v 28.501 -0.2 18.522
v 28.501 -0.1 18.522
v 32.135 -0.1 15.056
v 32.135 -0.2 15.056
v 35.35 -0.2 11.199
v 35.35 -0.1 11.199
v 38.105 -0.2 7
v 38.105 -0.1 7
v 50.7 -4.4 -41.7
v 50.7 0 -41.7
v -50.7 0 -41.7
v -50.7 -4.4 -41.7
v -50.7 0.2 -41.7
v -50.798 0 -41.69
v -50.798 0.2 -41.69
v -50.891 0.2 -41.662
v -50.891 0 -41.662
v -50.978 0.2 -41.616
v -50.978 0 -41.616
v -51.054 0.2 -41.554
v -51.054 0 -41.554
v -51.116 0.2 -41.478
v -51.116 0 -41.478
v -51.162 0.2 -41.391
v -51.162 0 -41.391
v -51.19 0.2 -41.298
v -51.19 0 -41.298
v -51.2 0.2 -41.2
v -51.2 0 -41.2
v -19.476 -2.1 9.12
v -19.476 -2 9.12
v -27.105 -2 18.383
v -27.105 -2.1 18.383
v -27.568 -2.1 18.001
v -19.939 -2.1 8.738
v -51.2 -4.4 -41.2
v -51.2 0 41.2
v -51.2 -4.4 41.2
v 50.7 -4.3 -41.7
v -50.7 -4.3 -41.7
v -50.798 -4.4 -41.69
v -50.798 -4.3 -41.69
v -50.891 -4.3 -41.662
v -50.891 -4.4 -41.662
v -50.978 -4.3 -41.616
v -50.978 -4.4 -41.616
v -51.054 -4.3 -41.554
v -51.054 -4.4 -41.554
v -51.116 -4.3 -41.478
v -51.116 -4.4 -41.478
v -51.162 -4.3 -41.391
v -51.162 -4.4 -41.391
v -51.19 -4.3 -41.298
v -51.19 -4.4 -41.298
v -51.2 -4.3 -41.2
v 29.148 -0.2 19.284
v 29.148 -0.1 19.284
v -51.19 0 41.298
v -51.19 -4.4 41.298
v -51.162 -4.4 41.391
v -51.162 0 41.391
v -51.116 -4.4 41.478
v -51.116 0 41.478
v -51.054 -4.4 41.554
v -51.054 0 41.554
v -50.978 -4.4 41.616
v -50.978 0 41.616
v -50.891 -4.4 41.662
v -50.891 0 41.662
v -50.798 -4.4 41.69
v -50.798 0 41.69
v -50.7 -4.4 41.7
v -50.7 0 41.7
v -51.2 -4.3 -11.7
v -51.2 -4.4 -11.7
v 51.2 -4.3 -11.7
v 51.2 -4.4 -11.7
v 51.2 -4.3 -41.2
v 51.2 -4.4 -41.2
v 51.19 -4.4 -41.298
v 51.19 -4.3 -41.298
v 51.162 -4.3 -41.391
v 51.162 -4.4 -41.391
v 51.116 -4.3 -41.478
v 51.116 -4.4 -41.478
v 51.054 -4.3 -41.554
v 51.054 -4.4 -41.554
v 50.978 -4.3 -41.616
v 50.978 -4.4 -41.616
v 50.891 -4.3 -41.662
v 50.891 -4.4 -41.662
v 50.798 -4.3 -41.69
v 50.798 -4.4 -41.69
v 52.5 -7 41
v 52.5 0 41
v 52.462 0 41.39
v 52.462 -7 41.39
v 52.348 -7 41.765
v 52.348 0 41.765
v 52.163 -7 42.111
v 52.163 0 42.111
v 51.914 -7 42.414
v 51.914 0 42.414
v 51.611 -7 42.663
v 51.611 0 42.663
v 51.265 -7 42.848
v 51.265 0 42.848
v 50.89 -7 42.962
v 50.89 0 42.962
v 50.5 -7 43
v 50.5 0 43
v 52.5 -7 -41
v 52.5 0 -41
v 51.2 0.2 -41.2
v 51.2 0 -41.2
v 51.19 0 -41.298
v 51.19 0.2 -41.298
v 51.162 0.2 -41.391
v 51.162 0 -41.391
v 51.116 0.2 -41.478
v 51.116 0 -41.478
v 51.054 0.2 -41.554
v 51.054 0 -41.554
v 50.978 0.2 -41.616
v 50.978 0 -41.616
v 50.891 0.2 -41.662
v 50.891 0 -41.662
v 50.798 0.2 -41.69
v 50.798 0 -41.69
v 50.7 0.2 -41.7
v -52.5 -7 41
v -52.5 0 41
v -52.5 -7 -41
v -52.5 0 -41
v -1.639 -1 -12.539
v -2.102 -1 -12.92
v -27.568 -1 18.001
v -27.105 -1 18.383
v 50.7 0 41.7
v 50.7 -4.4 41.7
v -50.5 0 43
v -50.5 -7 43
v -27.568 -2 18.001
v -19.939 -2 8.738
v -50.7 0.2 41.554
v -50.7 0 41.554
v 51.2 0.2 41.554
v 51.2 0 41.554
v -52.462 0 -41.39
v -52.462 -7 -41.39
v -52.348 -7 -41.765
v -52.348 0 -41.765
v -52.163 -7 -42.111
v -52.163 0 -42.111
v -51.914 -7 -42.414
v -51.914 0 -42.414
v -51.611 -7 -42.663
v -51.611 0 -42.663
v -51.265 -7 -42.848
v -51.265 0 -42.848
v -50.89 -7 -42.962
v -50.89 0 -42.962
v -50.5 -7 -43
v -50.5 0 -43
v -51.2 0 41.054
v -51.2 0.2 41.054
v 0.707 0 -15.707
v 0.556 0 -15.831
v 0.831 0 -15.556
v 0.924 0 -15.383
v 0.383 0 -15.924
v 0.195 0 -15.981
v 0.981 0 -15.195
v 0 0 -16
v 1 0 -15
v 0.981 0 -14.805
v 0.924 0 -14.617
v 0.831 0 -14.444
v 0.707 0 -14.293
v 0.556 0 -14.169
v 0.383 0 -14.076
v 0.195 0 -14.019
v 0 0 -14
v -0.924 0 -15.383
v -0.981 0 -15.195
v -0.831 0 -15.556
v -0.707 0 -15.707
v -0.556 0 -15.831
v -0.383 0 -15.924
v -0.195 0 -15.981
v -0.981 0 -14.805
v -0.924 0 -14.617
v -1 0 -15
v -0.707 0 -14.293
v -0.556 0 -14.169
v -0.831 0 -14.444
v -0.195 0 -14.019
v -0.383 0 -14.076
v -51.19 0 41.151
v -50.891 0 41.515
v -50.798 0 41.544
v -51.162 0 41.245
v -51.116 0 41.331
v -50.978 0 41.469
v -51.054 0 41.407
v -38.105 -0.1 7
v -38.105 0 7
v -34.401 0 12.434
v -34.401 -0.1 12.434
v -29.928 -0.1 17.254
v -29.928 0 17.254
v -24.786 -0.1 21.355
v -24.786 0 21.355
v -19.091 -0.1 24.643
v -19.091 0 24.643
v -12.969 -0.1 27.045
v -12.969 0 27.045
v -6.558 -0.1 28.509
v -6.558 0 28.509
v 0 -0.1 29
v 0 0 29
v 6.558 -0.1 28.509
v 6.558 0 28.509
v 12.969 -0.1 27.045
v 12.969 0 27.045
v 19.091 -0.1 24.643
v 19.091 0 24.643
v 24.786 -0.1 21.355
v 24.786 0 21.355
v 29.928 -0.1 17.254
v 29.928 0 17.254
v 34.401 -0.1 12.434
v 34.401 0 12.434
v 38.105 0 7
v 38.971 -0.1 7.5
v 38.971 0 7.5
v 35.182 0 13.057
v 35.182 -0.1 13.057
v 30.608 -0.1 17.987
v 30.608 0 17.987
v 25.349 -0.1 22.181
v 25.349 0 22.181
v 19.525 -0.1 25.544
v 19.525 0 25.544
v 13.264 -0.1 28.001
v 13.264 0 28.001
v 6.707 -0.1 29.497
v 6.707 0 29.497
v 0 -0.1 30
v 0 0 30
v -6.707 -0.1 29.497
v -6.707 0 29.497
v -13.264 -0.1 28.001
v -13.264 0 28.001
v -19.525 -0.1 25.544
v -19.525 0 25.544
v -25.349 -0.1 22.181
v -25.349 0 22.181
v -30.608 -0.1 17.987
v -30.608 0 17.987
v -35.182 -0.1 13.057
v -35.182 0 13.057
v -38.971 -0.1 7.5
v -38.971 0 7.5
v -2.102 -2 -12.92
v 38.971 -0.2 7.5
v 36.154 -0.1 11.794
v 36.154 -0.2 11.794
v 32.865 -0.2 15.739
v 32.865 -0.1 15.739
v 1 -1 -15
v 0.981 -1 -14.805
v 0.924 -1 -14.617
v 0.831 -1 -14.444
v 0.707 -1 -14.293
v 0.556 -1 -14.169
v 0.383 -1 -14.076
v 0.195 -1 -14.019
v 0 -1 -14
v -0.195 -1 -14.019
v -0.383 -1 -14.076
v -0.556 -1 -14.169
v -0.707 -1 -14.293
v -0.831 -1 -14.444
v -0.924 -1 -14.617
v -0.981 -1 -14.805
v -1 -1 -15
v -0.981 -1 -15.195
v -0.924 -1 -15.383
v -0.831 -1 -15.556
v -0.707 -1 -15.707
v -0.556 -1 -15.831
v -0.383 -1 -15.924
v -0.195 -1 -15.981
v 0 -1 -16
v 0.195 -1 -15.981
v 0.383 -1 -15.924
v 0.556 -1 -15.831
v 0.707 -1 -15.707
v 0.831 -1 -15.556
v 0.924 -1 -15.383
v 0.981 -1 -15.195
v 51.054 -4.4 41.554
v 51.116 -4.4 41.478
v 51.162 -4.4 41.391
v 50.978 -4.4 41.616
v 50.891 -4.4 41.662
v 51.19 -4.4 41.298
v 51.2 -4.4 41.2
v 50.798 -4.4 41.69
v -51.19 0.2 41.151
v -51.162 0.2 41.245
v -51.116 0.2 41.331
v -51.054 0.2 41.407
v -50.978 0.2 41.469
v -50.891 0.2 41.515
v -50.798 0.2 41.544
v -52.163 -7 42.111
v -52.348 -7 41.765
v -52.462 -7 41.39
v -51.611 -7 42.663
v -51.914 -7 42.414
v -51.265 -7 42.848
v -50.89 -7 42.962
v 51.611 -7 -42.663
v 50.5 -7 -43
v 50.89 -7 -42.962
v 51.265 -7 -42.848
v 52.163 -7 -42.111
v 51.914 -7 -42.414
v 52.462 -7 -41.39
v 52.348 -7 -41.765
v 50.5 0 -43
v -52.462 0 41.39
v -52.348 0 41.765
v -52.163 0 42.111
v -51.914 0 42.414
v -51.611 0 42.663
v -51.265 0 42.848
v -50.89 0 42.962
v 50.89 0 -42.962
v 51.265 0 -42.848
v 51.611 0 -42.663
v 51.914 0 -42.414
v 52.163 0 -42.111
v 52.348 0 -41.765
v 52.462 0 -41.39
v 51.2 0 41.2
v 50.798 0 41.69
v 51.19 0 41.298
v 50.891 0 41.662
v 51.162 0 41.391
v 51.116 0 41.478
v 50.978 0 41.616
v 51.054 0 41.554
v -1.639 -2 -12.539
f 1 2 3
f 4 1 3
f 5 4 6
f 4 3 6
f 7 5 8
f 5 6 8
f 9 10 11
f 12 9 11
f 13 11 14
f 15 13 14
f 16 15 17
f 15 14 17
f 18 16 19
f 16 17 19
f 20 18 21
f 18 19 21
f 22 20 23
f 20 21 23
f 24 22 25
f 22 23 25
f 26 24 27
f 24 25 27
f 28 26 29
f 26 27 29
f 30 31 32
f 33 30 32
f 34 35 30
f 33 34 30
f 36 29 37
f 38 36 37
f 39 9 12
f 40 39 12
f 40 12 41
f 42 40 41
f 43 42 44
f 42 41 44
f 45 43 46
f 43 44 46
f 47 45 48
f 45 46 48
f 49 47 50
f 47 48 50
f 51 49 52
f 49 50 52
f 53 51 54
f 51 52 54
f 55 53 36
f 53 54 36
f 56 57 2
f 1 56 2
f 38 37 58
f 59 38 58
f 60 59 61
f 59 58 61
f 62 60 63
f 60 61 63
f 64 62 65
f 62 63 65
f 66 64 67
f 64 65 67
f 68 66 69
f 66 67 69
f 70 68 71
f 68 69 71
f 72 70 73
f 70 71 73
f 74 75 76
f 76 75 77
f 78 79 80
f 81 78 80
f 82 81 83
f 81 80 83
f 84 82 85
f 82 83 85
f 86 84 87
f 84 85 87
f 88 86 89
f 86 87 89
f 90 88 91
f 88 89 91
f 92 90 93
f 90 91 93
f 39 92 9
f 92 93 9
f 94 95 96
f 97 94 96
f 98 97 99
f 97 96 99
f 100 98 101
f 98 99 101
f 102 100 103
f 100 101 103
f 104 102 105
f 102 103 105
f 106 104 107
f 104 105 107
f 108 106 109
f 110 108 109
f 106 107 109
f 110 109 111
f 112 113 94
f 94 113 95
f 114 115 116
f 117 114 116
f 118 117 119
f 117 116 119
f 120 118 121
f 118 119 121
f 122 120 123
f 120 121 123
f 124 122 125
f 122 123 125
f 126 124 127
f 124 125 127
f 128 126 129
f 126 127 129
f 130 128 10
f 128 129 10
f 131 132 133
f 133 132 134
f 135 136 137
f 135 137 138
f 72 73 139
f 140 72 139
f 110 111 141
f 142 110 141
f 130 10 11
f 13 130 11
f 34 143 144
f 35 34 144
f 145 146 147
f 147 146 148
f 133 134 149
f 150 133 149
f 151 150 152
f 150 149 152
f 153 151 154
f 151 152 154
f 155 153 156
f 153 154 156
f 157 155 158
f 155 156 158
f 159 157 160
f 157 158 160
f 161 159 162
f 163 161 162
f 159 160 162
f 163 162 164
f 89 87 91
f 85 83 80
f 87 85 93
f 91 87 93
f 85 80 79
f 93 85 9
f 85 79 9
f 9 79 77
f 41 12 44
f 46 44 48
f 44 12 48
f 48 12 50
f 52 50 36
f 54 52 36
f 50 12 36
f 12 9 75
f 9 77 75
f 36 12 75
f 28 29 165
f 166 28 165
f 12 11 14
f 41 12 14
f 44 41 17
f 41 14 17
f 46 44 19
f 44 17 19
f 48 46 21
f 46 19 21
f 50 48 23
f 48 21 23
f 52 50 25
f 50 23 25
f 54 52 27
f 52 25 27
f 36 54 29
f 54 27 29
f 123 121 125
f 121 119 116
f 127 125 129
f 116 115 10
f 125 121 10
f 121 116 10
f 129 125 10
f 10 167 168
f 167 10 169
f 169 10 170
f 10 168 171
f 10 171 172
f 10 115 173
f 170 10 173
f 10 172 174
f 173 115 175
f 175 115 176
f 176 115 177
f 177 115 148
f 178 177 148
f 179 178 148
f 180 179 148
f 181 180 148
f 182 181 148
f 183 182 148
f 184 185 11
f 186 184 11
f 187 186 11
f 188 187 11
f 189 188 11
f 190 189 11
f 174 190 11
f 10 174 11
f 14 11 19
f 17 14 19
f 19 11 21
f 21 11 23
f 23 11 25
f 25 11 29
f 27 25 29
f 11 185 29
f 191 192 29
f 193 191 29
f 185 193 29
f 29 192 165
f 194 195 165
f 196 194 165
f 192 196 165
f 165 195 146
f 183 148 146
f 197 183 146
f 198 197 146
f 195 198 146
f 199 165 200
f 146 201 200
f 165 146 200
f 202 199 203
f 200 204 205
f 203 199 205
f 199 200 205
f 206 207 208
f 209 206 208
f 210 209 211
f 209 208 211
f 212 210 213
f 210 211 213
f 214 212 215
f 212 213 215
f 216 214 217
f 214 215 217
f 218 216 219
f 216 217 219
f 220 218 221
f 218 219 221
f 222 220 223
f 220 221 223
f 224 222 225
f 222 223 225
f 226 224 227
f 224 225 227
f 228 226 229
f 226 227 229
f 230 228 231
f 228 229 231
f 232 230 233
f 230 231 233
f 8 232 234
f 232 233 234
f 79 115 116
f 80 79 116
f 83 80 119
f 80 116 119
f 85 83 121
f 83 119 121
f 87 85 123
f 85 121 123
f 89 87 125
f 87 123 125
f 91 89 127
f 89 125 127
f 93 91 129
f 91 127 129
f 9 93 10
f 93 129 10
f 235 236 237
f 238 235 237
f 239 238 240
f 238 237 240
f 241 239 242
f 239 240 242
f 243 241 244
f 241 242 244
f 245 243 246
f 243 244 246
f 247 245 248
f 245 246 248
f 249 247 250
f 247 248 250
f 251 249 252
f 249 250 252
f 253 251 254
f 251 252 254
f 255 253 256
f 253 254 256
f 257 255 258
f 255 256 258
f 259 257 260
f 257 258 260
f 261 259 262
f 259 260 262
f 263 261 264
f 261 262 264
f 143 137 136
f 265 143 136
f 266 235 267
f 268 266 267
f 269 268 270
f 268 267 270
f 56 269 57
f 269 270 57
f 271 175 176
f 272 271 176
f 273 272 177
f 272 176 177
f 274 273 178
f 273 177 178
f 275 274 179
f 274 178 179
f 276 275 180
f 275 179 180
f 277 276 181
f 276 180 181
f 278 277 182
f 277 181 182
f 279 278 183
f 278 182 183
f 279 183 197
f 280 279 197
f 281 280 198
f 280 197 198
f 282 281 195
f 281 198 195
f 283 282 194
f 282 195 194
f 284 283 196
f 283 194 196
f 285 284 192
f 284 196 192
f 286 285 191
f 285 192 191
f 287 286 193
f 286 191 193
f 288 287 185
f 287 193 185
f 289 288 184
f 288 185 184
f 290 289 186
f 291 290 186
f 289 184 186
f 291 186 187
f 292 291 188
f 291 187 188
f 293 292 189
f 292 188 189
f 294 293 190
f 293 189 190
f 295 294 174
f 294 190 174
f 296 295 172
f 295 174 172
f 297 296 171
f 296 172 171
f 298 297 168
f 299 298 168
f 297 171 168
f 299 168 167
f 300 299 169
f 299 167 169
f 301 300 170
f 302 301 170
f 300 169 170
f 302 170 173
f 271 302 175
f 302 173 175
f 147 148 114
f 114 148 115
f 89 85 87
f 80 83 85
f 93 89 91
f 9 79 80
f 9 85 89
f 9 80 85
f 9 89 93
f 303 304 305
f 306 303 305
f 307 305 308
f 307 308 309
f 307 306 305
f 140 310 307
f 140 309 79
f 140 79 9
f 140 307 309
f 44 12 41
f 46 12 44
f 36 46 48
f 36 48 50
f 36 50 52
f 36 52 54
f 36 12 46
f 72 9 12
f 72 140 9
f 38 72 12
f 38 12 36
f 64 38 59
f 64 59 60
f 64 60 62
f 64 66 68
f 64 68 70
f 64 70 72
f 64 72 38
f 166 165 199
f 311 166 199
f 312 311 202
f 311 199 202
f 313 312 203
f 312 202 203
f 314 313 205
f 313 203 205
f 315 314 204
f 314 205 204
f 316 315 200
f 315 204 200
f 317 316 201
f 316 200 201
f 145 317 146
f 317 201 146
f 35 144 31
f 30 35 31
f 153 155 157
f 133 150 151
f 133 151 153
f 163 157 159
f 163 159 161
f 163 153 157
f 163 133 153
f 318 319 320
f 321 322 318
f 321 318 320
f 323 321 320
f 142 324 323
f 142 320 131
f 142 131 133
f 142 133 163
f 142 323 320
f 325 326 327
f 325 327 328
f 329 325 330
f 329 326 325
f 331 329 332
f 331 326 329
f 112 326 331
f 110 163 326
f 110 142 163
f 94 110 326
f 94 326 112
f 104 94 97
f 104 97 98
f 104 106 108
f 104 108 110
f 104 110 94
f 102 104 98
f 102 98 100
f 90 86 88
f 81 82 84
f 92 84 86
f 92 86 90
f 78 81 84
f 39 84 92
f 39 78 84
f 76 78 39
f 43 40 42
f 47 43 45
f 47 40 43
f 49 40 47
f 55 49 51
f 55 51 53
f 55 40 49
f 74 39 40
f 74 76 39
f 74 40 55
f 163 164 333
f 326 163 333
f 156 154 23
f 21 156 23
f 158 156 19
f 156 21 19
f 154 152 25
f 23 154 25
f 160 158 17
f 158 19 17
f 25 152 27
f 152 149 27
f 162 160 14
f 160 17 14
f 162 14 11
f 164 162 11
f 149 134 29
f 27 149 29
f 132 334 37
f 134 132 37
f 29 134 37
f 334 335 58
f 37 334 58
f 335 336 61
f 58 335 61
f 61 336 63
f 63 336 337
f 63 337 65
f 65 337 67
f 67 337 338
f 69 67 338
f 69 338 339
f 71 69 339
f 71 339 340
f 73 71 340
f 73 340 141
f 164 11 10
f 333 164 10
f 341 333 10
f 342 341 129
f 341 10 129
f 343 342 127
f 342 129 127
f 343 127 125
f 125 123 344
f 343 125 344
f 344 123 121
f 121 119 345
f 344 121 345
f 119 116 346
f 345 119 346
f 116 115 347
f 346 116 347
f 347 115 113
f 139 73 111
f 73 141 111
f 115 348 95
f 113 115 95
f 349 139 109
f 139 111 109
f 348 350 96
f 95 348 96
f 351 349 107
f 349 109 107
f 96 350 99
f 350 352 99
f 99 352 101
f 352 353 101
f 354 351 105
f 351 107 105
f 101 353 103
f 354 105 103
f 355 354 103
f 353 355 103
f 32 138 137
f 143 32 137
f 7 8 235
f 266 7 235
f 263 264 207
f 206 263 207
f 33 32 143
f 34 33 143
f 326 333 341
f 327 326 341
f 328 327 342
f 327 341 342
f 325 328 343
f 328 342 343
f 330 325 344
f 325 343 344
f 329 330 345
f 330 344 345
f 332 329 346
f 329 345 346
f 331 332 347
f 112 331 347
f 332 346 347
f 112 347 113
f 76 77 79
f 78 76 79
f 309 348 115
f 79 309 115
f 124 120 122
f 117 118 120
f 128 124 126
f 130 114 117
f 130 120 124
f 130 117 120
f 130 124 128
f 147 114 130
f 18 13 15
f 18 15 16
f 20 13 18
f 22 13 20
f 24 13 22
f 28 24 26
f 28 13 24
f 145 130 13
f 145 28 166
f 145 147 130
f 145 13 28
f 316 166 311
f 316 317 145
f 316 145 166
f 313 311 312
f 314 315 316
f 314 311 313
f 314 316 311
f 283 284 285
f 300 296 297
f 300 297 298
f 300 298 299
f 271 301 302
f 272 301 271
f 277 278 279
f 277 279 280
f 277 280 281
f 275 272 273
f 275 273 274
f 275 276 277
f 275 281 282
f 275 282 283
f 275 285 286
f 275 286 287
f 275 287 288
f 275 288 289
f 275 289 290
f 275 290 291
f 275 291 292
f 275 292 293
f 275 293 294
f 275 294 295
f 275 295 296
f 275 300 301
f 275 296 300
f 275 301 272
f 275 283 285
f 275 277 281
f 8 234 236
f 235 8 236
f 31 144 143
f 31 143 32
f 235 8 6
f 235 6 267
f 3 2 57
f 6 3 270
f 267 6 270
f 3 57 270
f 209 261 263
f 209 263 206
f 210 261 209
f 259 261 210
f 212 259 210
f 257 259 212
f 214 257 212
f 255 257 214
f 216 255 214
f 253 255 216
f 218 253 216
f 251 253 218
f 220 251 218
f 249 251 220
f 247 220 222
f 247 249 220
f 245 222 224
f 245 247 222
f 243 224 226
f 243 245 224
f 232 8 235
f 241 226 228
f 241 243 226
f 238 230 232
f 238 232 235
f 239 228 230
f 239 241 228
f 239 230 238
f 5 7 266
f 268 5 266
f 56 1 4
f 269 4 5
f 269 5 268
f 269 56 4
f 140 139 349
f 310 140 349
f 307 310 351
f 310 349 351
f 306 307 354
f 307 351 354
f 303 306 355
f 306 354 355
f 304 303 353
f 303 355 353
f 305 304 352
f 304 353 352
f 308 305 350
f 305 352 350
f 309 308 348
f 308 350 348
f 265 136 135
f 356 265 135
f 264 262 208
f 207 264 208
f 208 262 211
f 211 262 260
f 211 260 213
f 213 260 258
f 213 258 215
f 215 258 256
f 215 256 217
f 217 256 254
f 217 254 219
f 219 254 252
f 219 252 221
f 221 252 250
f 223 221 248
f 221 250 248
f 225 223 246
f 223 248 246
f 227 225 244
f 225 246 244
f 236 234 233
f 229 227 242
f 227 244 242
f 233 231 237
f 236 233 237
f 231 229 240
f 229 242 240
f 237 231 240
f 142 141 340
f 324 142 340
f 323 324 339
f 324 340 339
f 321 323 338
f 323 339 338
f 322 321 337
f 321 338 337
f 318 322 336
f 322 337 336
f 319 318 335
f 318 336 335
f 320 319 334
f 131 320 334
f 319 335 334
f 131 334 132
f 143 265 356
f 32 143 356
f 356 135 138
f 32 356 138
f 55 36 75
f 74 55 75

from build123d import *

# Parameters (mm, degrees)
F1_DEPTH  = 7
F3_DEPTH  = 4.4
F5_DEPTH  = 0.2
F7_DEPTH  = 0.1
F8_R      = 1
F9_DEPTH  = 1
F11_DEPTH = 1
F13_DEPTH = 0.1
F15_DEPTH = 0.1
F17_DEPTH = 0.1


with BuildPart() as f1:
    # F0 (on Front) → F1 (new body)
    with BuildSketch(Plane.XZ):
        with BuildLine():
            Line((50.5, 43), (-50.5, 43))
            ThreePointArc((-50.5, 43), (-51.914214, 42.414214), (-52.5, 41))
            Line((-52.5, 41), (-52.5, -41))
            ThreePointArc((-52.5, -41), (-51.914214, -42.414214), (-50.5, -43))
            Line((-50.5, -43), (50.5, -43))
            ThreePointArc((50.5, -43), (51.914214, -42.414214), (52.5, -41))
            Line((52.5, -41), (52.5, 41))
            ThreePointArc((52.5, 41), (51.914214, 42.414214), (50.5, 43))
        make_face()
    extrude(amount=F1_DEPTH)

    # F2 (on face) → F3 (cut)
    with BuildSketch(Plane(origin=(0, 0, 0), x_dir=(-1, 0, 0), z_dir=(0, 1, 0))):
        with BuildLine():
            Line((-50.7, -41.7), (50.7, -41.7))
            ThreePointArc((50.7, -41.7), (51.053553, -41.553553), (51.2, -41.2))
            Line((51.2, -41.2), (51.2, 41.2))
            ThreePointArc((51.2, 41.2), (51.053553, 41.553553), (50.7, 41.7))
            Line((50.7, 41.7), (-50.7, 41.7))
            ThreePointArc((-50.7, 41.7), (-51.053553, 41.553553), (-51.2, 41.2))
            Line((-51.2, 41.2), (-51.2, -41.2))
            ThreePointArc((-51.2, -41.2), (-51.053553, -41.553553), (-50.7, -41.7))
        make_face()
    extrude(amount=-F3_DEPTH, mode=Mode.SUBTRACT)


with BuildPart() as f5:
    # F4 (on face) → F5 (new body)
    with BuildSketch(Plane(origin=(0, 0, 0), x_dir=(-1, 0, 0), z_dir=(0, 1, 0))):
        with BuildLine():
            Line((50.7, 41.553553), (-51.2, 41.553553))
            Line((-51.2, 41.553553), (-51.2, -41.2))
            ThreePointArc((-51.2, -41.2), (-51.053553, -41.553553), (-50.7, -41.7))
            Line((-50.7, -41.7), (50.7, -41.7))
            ThreePointArc((50.7, -41.7), (51.053553, -41.553553), (51.2, -41.2))
            Line((51.2, -41.2), (51.2, 41.053553))
            ThreePointArc((51.2, 41.053553), (51.053553, 41.407107), (50.7, 41.553553))
        make_face()
    extrude(amount=F5_DEPTH)

    # F8 (on face) → F9 (join)
    with BuildSketch(Plane.XZ):
        with Locations((0, -15)):
            Circle(F8_R)
    extrude(amount=F9_DEPTH)


with BuildPart() as f7:
    # F6 (on face) → F7 (new body)
    with BuildSketch(Plane.XZ):
        with BuildLine():
            ThreePointArc((38.971143, 7.5), (0, 30), (-38.971143, 7.5))
            Line((-38.971143, 7.5), (-38.105118, 7))
            ThreePointArc((-38.105118, 7), (0, 29), (38.105118, 7))
            Line((38.105118, 7), (38.971143, 7.5))
        make_face()
    extrude(amount=F7_DEPTH)


with BuildPart() as f11:
    # F10 (on face) → F11 (new body)
    with BuildSketch(Plane.XZ.offset(1)):
        Polygon((-1.638596, -12.538512), (-27.104926, 18.382825), (-27.568072, 18.001385), (-2.101742, -12.919952), align=None)
    extrude(amount=F11_DEPTH)


with BuildPart() as f13:
    # F12 (on face) → F13 (new body)
    with BuildSketch(Plane.XZ.offset(2)):
        Polygon((-27.104926, 18.382825), (-27.568072, 18.001385), (-19.939281, 8.738472), (-19.476136, 9.119912), align=None)
    extrude(amount=F13_DEPTH)


with BuildPart() as f15:
    # F14 (on face) → F15 (new body)
    with BuildSketch(Plane(origin=(0, -4.4, 0), x_dir=(-1, 0, 0), z_dir=(0, 1, 0))):
        with BuildLine():
            Line((51.2, -11.7), (-51.2, -11.7))
            Line((-51.2, -11.7), (-51.2, -41.2))
            ThreePointArc((-51.2, -41.2), (-51.053553, -41.553553), (-50.7, -41.7))
            Line((-50.7, -41.7), (50.7, -41.7))
            ThreePointArc((50.7, -41.7), (51.053553, -41.553553), (51.2, -41.2))
            Line((51.2, -41.2), (51.2, -11.7))
        make_face()
    extrude(amount=F15_DEPTH)


with BuildPart() as f17:
    # F16 (on face) → F17 (new body)
    with BuildSketch(Plane.XZ.offset(0.1)):
        with BuildLine():
            Line((29.148348, 19.283725), (28.500607, 18.521865))
            ThreePointArc((28.500607, 18.521865), (33.79747, 13.173232), (38.105118, 7))
            Line((38.105118, 7), (38.971143, 7.5))
            ThreePointArc((38.971143, 7.5), (34.565594, 13.813533), (29.148348, 19.283725))
        make_face()
    extrude(amount=F17_DEPTH)


solid = Compound([f1.part, f5.part, f7.part, f11.part, f13.part, f15.part, f17.part])
